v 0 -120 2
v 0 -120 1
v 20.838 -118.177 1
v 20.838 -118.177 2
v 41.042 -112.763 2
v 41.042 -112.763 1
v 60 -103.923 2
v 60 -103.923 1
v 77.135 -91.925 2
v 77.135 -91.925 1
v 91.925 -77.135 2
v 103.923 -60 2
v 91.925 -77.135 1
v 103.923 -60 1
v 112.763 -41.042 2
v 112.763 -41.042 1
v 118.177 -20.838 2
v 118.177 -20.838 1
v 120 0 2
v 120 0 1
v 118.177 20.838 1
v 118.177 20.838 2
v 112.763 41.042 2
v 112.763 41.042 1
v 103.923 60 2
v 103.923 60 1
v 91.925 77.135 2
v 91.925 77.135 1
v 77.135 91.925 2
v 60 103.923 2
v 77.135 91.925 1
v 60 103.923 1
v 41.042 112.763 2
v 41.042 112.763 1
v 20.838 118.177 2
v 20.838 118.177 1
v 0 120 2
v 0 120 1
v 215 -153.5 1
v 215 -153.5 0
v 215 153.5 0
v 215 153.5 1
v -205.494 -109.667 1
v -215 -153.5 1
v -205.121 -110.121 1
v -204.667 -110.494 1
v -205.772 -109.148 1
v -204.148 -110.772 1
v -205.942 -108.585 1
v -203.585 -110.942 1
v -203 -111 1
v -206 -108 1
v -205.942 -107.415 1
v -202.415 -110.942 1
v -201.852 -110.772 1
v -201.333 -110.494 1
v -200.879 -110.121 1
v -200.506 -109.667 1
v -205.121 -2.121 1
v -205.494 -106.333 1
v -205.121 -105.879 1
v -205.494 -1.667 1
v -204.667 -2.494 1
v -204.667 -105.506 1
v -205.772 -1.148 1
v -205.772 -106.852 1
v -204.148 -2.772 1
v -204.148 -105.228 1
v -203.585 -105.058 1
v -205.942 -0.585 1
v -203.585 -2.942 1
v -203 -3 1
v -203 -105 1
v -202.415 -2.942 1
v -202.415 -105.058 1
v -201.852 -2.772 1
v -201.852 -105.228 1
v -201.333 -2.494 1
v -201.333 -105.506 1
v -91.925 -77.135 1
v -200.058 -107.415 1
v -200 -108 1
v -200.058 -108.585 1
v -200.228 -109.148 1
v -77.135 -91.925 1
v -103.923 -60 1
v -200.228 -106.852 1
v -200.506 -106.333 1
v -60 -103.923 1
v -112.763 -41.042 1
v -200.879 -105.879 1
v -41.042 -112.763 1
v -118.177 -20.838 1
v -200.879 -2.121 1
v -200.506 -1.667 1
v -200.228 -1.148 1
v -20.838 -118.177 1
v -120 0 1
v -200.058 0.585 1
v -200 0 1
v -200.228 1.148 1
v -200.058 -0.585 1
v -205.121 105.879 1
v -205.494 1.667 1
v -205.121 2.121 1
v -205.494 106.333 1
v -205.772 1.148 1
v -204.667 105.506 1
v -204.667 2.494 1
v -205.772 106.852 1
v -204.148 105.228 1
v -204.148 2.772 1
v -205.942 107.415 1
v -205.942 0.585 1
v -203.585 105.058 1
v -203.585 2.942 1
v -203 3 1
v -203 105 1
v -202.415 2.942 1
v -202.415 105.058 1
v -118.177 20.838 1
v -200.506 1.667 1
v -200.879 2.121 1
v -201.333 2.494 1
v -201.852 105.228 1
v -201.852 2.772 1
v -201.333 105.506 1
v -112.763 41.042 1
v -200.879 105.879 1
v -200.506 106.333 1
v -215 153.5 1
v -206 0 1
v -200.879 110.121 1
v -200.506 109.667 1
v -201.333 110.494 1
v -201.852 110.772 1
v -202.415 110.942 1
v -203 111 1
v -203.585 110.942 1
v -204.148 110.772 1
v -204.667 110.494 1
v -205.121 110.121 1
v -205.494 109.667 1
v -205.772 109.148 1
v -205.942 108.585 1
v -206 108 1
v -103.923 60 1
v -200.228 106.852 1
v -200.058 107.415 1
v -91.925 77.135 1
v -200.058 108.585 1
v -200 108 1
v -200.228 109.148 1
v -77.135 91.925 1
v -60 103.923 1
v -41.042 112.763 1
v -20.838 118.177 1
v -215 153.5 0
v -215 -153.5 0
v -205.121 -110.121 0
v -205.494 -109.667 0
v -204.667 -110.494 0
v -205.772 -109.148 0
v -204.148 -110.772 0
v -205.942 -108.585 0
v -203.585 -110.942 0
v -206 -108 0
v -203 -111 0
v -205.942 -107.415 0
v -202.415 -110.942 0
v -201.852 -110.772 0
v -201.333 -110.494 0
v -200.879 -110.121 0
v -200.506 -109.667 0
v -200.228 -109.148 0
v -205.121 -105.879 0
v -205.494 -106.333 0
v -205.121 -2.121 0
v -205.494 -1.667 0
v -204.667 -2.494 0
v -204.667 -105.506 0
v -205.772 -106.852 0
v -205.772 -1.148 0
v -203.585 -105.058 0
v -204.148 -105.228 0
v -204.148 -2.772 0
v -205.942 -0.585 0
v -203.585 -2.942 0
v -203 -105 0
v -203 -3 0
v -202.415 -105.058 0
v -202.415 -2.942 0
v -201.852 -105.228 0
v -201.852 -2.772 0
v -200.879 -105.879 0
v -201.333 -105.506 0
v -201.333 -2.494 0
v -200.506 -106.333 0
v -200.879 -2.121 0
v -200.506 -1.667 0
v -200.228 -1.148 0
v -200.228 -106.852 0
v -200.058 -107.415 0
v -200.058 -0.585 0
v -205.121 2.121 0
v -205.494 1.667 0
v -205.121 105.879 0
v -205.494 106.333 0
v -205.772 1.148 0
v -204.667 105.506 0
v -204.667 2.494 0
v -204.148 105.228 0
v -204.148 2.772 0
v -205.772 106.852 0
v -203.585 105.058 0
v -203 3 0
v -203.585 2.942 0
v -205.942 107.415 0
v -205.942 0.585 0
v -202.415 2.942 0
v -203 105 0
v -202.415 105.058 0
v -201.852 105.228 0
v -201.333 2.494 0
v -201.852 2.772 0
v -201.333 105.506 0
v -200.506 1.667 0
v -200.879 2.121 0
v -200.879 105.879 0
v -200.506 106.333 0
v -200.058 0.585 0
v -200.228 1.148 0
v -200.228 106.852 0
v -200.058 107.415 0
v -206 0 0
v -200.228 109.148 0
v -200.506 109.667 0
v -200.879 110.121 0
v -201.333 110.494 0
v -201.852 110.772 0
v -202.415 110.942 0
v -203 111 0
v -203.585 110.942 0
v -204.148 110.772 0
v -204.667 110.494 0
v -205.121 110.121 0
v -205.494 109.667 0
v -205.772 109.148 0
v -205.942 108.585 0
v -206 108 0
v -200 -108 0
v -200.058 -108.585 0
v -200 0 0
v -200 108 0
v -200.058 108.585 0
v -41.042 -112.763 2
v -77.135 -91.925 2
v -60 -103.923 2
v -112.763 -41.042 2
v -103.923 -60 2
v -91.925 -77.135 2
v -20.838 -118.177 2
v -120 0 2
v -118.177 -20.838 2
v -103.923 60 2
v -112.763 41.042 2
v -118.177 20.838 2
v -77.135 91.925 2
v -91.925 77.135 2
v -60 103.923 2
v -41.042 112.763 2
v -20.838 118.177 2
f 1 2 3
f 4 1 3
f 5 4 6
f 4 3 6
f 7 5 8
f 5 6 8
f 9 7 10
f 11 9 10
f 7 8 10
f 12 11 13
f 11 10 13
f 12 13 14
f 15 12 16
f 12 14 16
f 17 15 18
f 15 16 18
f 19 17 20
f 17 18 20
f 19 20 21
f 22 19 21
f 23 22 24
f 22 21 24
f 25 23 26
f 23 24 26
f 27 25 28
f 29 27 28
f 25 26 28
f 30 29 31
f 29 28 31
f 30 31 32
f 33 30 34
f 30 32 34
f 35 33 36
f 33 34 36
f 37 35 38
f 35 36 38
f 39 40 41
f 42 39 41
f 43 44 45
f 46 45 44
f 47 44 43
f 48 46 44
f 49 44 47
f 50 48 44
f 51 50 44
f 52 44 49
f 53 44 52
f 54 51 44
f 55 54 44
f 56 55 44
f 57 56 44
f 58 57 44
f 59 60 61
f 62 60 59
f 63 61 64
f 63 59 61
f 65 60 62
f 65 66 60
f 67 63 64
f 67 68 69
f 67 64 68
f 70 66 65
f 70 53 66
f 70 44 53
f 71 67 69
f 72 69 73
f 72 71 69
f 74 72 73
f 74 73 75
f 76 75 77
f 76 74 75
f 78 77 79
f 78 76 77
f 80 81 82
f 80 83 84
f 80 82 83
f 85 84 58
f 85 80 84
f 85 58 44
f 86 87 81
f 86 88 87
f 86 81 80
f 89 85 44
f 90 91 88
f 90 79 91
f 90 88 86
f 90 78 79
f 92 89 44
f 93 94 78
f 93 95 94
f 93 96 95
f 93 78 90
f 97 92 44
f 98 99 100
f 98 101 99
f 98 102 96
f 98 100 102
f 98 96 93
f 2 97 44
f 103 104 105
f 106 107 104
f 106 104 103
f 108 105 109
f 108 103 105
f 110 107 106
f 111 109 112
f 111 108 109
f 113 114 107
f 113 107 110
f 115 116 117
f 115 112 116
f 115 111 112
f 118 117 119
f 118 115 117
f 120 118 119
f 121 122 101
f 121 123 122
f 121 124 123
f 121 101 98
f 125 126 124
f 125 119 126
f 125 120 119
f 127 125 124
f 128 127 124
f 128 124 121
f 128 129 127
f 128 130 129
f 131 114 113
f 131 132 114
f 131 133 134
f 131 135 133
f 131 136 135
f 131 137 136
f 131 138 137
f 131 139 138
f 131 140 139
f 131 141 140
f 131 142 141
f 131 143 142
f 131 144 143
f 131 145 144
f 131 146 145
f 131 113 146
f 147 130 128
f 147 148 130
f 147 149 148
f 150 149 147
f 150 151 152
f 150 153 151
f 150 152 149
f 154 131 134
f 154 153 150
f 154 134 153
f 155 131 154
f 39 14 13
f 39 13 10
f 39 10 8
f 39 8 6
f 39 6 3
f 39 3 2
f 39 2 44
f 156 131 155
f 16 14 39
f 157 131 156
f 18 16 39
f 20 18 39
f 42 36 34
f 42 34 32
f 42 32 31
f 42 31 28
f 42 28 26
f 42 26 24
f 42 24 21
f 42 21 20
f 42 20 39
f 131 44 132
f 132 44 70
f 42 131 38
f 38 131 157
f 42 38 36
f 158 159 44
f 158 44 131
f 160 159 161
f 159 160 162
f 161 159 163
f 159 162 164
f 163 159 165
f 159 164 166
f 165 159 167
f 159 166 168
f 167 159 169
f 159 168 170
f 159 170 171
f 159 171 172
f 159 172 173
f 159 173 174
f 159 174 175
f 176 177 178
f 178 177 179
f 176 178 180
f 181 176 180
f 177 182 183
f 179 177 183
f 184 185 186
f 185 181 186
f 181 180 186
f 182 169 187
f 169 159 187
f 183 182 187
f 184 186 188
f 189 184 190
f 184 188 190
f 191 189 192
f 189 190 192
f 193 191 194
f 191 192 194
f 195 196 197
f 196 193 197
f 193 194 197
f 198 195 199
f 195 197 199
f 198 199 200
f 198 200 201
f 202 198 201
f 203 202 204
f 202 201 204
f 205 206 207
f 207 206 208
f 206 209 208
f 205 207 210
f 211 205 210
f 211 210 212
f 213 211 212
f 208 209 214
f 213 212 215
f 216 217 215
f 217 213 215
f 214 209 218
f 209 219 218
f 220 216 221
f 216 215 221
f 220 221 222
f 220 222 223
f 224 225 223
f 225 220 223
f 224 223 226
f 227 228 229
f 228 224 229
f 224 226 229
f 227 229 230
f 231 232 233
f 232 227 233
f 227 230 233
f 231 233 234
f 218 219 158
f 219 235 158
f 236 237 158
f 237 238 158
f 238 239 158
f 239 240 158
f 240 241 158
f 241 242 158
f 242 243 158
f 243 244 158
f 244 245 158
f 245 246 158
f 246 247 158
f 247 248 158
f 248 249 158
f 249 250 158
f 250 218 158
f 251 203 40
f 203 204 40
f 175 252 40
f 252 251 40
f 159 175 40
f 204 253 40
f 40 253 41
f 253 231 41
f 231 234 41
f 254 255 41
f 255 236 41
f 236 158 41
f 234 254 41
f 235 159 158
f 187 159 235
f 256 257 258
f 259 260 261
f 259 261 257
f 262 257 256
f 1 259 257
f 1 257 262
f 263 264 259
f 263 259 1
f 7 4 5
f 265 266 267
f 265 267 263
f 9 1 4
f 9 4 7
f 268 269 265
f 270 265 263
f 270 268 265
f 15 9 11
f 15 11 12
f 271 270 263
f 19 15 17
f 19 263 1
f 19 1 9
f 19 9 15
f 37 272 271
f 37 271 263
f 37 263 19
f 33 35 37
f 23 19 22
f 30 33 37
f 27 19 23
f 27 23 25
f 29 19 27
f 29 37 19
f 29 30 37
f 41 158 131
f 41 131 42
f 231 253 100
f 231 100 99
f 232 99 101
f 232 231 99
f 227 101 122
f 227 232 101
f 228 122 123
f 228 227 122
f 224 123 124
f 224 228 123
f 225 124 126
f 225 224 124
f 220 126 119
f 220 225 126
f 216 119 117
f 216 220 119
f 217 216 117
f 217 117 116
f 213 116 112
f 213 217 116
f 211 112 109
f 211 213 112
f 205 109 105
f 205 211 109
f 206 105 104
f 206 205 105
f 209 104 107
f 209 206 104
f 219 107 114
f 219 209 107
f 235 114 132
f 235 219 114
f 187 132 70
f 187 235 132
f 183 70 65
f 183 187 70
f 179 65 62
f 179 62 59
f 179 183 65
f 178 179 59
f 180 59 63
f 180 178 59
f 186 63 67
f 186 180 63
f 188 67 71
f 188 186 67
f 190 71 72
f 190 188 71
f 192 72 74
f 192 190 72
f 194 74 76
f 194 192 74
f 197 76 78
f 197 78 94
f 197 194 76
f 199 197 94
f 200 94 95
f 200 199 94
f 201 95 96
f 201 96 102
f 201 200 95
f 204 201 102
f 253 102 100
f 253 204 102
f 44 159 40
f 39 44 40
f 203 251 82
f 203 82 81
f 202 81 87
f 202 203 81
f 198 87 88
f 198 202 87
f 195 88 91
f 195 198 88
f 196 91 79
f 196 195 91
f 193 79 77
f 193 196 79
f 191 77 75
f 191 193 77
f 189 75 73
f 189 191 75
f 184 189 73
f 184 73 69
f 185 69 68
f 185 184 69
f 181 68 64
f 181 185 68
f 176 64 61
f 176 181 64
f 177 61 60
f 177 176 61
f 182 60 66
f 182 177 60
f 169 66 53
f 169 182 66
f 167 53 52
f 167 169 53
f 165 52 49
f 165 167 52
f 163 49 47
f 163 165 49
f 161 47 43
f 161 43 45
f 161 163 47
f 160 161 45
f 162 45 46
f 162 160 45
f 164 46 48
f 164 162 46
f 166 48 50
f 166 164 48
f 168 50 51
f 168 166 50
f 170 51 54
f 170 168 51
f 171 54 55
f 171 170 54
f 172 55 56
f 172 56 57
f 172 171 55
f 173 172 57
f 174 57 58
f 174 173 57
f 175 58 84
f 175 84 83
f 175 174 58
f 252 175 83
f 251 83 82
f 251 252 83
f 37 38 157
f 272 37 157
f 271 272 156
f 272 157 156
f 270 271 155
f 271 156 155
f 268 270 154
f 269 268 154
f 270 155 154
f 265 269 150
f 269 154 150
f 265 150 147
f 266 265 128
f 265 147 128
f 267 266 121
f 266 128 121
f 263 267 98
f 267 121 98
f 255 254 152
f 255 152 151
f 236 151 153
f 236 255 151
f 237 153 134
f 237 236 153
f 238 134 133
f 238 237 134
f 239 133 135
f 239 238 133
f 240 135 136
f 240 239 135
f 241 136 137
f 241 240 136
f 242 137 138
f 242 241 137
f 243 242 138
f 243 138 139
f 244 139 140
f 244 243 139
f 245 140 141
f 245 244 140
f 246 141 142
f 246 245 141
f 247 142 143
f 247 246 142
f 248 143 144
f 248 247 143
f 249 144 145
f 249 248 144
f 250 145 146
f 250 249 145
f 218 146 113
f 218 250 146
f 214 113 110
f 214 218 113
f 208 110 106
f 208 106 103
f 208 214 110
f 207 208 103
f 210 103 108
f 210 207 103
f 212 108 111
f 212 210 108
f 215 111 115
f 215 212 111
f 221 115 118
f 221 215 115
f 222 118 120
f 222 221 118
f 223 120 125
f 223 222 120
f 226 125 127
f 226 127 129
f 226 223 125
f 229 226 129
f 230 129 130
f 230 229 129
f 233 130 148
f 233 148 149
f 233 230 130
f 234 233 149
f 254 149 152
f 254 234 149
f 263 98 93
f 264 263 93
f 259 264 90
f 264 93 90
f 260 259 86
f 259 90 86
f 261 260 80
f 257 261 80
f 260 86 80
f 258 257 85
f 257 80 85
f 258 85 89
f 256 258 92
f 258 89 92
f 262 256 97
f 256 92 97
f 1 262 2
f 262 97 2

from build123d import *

# Parameters (mm, degrees)
F0_W     = 430
F0_H     = 307
F0_R     = 3
F1_DEPTH = 1
F2_DEPTH = 2


with BuildPart() as f1:
    # F0 (on Top) → F1 (new body)
    with BuildSketch(Plane.XY):
        Rectangle(F0_W, F0_H)
        with Locations((-203, -108)):
            Circle(F0_R, mode=Mode.SUBTRACT)
        with Locations((-203, 0)):
            Circle(F0_R, mode=Mode.SUBTRACT)
        with Locations((-203, 108)):
            Circle(F0_R, mode=Mode.SUBTRACT)
        with BuildLine():
            ThreePointArc((0, 120), (84.852814, 84.852814), (120, 0))
            ThreePointArc((120, 0), (84.852814, -84.852814), (0, -120))
            ThreePointArc((0, -120), (-84.852814, -84.852814), (-120, 0))
            ThreePointArc((-120, 0), (-84.852814, 84.852814), (0, 120))
        make_face(mode=Mode.SUBTRACT)
    extrude(amount=F1_DEPTH)

    # F0 (on Top) → F2 (join)
    with BuildSketch(Plane.XY):
        with BuildLine():
            Line((0, 0), (0, 120))
            ThreePointArc((0, 120), (-84.852814, 84.852814), (-120, 0))
            Line((-120, 0), (0, 0))
        make_face()
        with BuildLine():
            Line((0, 0), (120, 0))
            ThreePointArc((120, 0), (84.852814, 84.852814), (0, 120))
            Line((0, 120), (0, 0))
        make_face()
        with BuildLine():
            ThreePointArc((0, -120), (84.852814, -84.852814), (120, 0))
            Line((120, 0), (0, 0))
            Line((0, 0), (0, -120))
        make_face()
        with BuildLine():
            ThreePointArc((-120, 0), (-84.852814, -84.852814), (0, -120))
            Line((0, -120), (0, 0))
            Line((0, 0), (-120, 0))
        make_face()
    extrude(amount=F2_DEPTH)


solid = f1.part
